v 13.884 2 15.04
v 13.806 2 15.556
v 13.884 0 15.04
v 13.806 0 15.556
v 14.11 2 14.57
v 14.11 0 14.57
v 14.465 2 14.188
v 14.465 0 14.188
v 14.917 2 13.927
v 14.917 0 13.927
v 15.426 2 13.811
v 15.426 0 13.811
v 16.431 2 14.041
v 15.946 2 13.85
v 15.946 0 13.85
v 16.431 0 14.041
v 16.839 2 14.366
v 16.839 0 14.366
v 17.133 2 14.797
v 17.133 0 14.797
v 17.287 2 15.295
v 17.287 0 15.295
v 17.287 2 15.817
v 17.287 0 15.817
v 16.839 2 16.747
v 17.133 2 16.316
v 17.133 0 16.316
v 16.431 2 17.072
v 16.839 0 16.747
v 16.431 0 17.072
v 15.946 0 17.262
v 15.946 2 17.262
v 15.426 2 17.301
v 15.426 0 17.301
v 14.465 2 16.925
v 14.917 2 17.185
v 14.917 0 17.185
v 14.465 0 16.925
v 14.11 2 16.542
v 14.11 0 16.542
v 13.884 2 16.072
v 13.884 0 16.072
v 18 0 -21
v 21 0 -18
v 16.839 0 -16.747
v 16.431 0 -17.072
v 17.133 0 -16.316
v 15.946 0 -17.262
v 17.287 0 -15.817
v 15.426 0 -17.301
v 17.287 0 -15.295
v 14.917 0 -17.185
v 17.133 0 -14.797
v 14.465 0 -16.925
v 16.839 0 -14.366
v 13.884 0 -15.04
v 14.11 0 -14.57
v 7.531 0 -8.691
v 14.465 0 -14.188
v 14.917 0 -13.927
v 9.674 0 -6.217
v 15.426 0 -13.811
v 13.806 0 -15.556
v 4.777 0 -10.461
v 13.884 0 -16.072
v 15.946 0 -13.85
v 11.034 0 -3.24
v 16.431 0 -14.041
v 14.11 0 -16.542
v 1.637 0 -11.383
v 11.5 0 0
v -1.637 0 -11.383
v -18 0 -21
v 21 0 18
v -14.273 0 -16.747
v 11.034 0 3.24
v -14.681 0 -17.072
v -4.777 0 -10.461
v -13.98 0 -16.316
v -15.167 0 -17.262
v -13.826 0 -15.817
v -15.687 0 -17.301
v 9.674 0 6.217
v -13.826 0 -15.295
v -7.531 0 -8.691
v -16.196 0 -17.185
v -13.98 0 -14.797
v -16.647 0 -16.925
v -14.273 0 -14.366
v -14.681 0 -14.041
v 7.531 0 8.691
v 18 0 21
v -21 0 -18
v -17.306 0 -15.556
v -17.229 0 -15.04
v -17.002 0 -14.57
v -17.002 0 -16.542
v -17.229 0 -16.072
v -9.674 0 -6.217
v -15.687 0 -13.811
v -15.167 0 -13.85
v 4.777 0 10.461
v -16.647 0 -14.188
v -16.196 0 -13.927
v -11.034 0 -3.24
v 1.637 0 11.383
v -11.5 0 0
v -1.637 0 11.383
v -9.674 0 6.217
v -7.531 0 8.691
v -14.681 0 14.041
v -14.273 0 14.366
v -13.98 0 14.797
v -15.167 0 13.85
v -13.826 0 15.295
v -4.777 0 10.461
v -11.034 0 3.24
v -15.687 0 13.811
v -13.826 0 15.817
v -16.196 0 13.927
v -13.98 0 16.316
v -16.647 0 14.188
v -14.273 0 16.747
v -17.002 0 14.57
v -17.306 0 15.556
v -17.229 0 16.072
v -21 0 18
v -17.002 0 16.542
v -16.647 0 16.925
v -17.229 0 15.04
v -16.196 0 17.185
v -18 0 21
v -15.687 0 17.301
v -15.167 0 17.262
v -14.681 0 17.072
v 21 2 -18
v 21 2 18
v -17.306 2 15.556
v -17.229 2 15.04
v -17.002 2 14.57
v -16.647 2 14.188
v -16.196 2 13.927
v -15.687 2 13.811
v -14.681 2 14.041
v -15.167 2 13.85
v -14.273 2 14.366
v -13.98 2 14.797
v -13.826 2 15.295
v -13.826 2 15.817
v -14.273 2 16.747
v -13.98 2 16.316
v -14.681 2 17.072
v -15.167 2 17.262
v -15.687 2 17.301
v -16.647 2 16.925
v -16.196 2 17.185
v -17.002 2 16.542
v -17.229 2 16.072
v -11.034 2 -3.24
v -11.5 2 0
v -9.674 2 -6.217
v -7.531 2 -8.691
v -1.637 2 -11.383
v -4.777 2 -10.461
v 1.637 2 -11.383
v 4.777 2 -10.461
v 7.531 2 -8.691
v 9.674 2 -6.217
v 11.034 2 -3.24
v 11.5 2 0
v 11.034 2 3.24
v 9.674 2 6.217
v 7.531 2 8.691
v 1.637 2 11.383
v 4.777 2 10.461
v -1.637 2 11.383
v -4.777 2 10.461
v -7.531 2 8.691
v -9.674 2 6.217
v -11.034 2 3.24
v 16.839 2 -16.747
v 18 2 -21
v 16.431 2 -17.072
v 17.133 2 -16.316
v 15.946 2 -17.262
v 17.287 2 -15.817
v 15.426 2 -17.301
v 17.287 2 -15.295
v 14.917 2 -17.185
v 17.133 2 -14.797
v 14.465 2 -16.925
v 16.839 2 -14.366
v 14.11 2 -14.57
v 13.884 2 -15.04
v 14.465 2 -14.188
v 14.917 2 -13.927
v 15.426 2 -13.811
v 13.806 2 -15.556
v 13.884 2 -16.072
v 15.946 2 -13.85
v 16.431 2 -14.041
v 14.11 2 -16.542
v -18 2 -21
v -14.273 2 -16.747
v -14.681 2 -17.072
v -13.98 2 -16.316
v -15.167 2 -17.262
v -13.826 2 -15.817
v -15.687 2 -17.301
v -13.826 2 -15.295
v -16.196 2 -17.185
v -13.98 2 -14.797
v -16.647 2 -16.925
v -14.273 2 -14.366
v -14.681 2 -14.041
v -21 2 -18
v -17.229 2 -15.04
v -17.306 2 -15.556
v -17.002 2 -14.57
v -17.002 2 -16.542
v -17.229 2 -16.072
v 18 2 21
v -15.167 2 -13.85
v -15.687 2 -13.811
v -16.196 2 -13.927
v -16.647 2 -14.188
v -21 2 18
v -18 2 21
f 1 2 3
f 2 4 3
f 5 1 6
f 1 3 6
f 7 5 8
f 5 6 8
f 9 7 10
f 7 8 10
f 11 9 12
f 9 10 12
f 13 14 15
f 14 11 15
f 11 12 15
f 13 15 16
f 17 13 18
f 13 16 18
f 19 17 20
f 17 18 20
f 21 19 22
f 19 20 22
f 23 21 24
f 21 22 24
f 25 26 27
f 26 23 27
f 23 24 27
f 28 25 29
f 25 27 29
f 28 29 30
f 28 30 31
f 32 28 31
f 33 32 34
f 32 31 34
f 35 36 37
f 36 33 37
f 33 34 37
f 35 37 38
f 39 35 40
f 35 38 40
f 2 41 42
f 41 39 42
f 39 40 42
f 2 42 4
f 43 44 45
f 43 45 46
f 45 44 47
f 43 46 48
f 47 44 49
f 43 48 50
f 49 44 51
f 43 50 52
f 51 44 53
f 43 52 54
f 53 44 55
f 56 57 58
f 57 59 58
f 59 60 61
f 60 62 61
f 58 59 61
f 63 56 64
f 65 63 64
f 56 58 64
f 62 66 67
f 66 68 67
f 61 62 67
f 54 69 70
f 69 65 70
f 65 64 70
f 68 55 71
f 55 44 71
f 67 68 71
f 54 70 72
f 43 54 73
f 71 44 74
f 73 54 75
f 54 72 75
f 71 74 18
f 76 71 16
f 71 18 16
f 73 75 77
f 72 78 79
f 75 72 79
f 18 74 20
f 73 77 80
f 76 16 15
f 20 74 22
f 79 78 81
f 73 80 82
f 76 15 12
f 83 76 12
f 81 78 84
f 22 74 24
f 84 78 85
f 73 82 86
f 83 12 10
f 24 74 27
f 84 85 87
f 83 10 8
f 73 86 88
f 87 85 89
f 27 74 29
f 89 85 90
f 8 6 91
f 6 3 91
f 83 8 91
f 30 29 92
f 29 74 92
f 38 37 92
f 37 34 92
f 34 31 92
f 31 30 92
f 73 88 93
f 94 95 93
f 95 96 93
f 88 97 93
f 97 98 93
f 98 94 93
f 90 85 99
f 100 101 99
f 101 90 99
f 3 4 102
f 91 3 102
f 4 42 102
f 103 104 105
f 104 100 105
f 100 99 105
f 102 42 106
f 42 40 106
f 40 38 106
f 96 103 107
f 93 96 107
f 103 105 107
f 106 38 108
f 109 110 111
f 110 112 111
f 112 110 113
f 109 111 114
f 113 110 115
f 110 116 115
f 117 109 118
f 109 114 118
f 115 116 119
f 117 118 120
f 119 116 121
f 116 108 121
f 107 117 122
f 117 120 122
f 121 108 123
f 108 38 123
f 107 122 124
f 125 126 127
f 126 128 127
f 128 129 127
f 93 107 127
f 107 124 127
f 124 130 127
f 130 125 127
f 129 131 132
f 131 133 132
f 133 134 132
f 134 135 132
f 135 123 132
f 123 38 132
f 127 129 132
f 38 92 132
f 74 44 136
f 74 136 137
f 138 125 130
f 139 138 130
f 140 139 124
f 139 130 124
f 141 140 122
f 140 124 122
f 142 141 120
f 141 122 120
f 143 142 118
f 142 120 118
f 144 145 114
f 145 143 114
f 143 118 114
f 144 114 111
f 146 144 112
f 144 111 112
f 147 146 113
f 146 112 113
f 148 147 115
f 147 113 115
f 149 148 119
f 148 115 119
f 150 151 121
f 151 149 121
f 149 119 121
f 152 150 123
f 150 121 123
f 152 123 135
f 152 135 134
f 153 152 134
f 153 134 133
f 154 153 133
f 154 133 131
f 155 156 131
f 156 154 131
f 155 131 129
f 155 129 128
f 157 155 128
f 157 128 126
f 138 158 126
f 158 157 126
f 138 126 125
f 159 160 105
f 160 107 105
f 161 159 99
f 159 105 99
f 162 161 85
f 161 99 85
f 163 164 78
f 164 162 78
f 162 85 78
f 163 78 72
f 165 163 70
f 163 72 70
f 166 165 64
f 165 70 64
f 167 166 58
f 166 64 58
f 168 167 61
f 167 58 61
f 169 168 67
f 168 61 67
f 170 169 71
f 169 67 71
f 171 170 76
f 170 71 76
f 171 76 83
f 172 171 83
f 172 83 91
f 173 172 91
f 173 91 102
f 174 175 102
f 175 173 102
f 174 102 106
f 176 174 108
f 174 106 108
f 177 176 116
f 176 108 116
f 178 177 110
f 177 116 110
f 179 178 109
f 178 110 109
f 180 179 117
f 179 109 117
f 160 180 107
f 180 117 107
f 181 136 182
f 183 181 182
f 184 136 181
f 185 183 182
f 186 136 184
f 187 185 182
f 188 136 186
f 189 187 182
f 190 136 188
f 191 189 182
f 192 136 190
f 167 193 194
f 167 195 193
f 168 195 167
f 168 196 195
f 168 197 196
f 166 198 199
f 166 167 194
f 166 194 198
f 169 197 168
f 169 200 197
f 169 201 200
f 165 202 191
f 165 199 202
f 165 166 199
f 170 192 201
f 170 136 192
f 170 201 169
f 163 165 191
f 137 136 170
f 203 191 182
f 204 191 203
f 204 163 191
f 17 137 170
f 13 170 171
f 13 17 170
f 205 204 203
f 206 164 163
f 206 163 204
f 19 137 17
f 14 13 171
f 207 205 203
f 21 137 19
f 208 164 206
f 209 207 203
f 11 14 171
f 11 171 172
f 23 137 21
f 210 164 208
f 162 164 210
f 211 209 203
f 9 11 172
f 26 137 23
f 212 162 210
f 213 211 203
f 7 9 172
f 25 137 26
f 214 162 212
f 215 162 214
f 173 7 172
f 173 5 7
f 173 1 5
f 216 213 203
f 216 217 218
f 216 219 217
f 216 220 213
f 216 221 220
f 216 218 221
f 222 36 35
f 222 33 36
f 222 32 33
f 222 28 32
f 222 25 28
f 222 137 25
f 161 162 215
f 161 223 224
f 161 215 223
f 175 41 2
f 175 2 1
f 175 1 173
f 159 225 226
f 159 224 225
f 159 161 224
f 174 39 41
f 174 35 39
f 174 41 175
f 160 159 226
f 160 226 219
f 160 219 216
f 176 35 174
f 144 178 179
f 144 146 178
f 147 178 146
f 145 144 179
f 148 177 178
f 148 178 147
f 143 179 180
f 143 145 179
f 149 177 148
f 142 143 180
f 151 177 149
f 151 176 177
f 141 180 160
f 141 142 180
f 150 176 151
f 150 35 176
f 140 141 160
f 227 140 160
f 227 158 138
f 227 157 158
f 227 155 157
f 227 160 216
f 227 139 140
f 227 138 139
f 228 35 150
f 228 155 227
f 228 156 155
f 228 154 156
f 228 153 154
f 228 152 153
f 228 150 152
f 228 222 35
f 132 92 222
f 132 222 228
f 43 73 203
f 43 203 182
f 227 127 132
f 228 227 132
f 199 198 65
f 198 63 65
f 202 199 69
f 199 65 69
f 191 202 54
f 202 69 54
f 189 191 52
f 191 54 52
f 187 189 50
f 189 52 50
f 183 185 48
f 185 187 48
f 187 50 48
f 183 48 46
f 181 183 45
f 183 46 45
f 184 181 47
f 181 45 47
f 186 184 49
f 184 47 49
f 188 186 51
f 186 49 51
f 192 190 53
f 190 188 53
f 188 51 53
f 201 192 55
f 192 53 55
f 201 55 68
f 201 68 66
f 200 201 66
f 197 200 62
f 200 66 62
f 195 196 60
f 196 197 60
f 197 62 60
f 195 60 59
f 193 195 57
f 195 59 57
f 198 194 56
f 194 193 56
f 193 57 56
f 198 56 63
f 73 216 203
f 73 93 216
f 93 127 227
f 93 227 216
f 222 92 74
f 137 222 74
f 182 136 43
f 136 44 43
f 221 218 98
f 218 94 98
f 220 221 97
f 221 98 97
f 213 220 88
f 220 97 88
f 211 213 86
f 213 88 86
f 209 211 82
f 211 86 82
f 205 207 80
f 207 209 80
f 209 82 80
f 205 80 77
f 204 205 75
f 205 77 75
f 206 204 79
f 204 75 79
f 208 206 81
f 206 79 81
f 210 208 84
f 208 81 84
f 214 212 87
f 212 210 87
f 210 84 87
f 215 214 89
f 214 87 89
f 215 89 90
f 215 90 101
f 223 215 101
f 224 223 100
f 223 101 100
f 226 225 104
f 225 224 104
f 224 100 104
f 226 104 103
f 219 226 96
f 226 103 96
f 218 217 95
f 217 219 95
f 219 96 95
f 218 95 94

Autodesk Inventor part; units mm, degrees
ref_plane "YZ Plane" through (0, 0, 0) normal (1, 0, 0) x (0, 1, 0)
ref_plane "XZ Plane" through (0, 0, 0) normal (0, 1, 0) x (-1, 0, 0)
ref_plane "XY Plane" through (0, 0, 0) normal (0, 0, 1) x (1, 0, 0)
sketch "Sketch1" plane through (0, 0, 0) normal (0, 1, 0) x (-1, 0, 0)
  line L0 (18, -21) -> (-18, -21)
  line L1 (-21, -18) -> (-21, 18)
  line L2 (-18, 21) -> (18, 21)
  line L3 (21, 18) -> (21, -18)
  line L4 (21, -21) -> (-21, 21) construction
  line L5 (-21, -21) -> (21, 21) construction
  line L6 (21, 18) -> (18, 21)
  line L7 (-21, -18) -> (-18, -21)
  line L8 (-18, 21) -> (-21, 18)
  line L9 (21, -18) -> (18, -21)
  line L10 (19.5, 19.5) -> (15.0999, 15.0999) construction
  circle A0 centre (15.5563, 15.5563) radius 1.75
  circle A1 centre (-15.5563, 15.5563) radius 1.75
  circle A2 centre (-15.5563, -15.5563) radius 1.75
  circle A3 centre (15.5563, -15.5563) radius 1.75
  circle A4 centre (0, 0) radius 11.5
  line L11 (-15.5563, 15.5563) -> (15.5563, -15.5563) construction
  dimension "d0" = 42
  dimension "d1" = 42
  dimension "d2" = 3
  dimension "d3" = 3
  dimension "d4" = 3
  dimension "d5" = 3
  dimension "d6" = 3
  dimension "d7" = 3
  dimension "d8" = 3
  dimension "d9" = 3
  dimension "d11" = 3.5
  dimension "d14" = 360
  dimension "d16" = 23
  dimension "d20" = 22
extrude "Extrusion1" add sketch "Sketch1" along normal blind 2
equation "\"d3\" = d2"
equation "\"d5\" = d4"
equation "\"d7\" = d6"
equation "\"d9\" = d8"
properties part number "washer"
